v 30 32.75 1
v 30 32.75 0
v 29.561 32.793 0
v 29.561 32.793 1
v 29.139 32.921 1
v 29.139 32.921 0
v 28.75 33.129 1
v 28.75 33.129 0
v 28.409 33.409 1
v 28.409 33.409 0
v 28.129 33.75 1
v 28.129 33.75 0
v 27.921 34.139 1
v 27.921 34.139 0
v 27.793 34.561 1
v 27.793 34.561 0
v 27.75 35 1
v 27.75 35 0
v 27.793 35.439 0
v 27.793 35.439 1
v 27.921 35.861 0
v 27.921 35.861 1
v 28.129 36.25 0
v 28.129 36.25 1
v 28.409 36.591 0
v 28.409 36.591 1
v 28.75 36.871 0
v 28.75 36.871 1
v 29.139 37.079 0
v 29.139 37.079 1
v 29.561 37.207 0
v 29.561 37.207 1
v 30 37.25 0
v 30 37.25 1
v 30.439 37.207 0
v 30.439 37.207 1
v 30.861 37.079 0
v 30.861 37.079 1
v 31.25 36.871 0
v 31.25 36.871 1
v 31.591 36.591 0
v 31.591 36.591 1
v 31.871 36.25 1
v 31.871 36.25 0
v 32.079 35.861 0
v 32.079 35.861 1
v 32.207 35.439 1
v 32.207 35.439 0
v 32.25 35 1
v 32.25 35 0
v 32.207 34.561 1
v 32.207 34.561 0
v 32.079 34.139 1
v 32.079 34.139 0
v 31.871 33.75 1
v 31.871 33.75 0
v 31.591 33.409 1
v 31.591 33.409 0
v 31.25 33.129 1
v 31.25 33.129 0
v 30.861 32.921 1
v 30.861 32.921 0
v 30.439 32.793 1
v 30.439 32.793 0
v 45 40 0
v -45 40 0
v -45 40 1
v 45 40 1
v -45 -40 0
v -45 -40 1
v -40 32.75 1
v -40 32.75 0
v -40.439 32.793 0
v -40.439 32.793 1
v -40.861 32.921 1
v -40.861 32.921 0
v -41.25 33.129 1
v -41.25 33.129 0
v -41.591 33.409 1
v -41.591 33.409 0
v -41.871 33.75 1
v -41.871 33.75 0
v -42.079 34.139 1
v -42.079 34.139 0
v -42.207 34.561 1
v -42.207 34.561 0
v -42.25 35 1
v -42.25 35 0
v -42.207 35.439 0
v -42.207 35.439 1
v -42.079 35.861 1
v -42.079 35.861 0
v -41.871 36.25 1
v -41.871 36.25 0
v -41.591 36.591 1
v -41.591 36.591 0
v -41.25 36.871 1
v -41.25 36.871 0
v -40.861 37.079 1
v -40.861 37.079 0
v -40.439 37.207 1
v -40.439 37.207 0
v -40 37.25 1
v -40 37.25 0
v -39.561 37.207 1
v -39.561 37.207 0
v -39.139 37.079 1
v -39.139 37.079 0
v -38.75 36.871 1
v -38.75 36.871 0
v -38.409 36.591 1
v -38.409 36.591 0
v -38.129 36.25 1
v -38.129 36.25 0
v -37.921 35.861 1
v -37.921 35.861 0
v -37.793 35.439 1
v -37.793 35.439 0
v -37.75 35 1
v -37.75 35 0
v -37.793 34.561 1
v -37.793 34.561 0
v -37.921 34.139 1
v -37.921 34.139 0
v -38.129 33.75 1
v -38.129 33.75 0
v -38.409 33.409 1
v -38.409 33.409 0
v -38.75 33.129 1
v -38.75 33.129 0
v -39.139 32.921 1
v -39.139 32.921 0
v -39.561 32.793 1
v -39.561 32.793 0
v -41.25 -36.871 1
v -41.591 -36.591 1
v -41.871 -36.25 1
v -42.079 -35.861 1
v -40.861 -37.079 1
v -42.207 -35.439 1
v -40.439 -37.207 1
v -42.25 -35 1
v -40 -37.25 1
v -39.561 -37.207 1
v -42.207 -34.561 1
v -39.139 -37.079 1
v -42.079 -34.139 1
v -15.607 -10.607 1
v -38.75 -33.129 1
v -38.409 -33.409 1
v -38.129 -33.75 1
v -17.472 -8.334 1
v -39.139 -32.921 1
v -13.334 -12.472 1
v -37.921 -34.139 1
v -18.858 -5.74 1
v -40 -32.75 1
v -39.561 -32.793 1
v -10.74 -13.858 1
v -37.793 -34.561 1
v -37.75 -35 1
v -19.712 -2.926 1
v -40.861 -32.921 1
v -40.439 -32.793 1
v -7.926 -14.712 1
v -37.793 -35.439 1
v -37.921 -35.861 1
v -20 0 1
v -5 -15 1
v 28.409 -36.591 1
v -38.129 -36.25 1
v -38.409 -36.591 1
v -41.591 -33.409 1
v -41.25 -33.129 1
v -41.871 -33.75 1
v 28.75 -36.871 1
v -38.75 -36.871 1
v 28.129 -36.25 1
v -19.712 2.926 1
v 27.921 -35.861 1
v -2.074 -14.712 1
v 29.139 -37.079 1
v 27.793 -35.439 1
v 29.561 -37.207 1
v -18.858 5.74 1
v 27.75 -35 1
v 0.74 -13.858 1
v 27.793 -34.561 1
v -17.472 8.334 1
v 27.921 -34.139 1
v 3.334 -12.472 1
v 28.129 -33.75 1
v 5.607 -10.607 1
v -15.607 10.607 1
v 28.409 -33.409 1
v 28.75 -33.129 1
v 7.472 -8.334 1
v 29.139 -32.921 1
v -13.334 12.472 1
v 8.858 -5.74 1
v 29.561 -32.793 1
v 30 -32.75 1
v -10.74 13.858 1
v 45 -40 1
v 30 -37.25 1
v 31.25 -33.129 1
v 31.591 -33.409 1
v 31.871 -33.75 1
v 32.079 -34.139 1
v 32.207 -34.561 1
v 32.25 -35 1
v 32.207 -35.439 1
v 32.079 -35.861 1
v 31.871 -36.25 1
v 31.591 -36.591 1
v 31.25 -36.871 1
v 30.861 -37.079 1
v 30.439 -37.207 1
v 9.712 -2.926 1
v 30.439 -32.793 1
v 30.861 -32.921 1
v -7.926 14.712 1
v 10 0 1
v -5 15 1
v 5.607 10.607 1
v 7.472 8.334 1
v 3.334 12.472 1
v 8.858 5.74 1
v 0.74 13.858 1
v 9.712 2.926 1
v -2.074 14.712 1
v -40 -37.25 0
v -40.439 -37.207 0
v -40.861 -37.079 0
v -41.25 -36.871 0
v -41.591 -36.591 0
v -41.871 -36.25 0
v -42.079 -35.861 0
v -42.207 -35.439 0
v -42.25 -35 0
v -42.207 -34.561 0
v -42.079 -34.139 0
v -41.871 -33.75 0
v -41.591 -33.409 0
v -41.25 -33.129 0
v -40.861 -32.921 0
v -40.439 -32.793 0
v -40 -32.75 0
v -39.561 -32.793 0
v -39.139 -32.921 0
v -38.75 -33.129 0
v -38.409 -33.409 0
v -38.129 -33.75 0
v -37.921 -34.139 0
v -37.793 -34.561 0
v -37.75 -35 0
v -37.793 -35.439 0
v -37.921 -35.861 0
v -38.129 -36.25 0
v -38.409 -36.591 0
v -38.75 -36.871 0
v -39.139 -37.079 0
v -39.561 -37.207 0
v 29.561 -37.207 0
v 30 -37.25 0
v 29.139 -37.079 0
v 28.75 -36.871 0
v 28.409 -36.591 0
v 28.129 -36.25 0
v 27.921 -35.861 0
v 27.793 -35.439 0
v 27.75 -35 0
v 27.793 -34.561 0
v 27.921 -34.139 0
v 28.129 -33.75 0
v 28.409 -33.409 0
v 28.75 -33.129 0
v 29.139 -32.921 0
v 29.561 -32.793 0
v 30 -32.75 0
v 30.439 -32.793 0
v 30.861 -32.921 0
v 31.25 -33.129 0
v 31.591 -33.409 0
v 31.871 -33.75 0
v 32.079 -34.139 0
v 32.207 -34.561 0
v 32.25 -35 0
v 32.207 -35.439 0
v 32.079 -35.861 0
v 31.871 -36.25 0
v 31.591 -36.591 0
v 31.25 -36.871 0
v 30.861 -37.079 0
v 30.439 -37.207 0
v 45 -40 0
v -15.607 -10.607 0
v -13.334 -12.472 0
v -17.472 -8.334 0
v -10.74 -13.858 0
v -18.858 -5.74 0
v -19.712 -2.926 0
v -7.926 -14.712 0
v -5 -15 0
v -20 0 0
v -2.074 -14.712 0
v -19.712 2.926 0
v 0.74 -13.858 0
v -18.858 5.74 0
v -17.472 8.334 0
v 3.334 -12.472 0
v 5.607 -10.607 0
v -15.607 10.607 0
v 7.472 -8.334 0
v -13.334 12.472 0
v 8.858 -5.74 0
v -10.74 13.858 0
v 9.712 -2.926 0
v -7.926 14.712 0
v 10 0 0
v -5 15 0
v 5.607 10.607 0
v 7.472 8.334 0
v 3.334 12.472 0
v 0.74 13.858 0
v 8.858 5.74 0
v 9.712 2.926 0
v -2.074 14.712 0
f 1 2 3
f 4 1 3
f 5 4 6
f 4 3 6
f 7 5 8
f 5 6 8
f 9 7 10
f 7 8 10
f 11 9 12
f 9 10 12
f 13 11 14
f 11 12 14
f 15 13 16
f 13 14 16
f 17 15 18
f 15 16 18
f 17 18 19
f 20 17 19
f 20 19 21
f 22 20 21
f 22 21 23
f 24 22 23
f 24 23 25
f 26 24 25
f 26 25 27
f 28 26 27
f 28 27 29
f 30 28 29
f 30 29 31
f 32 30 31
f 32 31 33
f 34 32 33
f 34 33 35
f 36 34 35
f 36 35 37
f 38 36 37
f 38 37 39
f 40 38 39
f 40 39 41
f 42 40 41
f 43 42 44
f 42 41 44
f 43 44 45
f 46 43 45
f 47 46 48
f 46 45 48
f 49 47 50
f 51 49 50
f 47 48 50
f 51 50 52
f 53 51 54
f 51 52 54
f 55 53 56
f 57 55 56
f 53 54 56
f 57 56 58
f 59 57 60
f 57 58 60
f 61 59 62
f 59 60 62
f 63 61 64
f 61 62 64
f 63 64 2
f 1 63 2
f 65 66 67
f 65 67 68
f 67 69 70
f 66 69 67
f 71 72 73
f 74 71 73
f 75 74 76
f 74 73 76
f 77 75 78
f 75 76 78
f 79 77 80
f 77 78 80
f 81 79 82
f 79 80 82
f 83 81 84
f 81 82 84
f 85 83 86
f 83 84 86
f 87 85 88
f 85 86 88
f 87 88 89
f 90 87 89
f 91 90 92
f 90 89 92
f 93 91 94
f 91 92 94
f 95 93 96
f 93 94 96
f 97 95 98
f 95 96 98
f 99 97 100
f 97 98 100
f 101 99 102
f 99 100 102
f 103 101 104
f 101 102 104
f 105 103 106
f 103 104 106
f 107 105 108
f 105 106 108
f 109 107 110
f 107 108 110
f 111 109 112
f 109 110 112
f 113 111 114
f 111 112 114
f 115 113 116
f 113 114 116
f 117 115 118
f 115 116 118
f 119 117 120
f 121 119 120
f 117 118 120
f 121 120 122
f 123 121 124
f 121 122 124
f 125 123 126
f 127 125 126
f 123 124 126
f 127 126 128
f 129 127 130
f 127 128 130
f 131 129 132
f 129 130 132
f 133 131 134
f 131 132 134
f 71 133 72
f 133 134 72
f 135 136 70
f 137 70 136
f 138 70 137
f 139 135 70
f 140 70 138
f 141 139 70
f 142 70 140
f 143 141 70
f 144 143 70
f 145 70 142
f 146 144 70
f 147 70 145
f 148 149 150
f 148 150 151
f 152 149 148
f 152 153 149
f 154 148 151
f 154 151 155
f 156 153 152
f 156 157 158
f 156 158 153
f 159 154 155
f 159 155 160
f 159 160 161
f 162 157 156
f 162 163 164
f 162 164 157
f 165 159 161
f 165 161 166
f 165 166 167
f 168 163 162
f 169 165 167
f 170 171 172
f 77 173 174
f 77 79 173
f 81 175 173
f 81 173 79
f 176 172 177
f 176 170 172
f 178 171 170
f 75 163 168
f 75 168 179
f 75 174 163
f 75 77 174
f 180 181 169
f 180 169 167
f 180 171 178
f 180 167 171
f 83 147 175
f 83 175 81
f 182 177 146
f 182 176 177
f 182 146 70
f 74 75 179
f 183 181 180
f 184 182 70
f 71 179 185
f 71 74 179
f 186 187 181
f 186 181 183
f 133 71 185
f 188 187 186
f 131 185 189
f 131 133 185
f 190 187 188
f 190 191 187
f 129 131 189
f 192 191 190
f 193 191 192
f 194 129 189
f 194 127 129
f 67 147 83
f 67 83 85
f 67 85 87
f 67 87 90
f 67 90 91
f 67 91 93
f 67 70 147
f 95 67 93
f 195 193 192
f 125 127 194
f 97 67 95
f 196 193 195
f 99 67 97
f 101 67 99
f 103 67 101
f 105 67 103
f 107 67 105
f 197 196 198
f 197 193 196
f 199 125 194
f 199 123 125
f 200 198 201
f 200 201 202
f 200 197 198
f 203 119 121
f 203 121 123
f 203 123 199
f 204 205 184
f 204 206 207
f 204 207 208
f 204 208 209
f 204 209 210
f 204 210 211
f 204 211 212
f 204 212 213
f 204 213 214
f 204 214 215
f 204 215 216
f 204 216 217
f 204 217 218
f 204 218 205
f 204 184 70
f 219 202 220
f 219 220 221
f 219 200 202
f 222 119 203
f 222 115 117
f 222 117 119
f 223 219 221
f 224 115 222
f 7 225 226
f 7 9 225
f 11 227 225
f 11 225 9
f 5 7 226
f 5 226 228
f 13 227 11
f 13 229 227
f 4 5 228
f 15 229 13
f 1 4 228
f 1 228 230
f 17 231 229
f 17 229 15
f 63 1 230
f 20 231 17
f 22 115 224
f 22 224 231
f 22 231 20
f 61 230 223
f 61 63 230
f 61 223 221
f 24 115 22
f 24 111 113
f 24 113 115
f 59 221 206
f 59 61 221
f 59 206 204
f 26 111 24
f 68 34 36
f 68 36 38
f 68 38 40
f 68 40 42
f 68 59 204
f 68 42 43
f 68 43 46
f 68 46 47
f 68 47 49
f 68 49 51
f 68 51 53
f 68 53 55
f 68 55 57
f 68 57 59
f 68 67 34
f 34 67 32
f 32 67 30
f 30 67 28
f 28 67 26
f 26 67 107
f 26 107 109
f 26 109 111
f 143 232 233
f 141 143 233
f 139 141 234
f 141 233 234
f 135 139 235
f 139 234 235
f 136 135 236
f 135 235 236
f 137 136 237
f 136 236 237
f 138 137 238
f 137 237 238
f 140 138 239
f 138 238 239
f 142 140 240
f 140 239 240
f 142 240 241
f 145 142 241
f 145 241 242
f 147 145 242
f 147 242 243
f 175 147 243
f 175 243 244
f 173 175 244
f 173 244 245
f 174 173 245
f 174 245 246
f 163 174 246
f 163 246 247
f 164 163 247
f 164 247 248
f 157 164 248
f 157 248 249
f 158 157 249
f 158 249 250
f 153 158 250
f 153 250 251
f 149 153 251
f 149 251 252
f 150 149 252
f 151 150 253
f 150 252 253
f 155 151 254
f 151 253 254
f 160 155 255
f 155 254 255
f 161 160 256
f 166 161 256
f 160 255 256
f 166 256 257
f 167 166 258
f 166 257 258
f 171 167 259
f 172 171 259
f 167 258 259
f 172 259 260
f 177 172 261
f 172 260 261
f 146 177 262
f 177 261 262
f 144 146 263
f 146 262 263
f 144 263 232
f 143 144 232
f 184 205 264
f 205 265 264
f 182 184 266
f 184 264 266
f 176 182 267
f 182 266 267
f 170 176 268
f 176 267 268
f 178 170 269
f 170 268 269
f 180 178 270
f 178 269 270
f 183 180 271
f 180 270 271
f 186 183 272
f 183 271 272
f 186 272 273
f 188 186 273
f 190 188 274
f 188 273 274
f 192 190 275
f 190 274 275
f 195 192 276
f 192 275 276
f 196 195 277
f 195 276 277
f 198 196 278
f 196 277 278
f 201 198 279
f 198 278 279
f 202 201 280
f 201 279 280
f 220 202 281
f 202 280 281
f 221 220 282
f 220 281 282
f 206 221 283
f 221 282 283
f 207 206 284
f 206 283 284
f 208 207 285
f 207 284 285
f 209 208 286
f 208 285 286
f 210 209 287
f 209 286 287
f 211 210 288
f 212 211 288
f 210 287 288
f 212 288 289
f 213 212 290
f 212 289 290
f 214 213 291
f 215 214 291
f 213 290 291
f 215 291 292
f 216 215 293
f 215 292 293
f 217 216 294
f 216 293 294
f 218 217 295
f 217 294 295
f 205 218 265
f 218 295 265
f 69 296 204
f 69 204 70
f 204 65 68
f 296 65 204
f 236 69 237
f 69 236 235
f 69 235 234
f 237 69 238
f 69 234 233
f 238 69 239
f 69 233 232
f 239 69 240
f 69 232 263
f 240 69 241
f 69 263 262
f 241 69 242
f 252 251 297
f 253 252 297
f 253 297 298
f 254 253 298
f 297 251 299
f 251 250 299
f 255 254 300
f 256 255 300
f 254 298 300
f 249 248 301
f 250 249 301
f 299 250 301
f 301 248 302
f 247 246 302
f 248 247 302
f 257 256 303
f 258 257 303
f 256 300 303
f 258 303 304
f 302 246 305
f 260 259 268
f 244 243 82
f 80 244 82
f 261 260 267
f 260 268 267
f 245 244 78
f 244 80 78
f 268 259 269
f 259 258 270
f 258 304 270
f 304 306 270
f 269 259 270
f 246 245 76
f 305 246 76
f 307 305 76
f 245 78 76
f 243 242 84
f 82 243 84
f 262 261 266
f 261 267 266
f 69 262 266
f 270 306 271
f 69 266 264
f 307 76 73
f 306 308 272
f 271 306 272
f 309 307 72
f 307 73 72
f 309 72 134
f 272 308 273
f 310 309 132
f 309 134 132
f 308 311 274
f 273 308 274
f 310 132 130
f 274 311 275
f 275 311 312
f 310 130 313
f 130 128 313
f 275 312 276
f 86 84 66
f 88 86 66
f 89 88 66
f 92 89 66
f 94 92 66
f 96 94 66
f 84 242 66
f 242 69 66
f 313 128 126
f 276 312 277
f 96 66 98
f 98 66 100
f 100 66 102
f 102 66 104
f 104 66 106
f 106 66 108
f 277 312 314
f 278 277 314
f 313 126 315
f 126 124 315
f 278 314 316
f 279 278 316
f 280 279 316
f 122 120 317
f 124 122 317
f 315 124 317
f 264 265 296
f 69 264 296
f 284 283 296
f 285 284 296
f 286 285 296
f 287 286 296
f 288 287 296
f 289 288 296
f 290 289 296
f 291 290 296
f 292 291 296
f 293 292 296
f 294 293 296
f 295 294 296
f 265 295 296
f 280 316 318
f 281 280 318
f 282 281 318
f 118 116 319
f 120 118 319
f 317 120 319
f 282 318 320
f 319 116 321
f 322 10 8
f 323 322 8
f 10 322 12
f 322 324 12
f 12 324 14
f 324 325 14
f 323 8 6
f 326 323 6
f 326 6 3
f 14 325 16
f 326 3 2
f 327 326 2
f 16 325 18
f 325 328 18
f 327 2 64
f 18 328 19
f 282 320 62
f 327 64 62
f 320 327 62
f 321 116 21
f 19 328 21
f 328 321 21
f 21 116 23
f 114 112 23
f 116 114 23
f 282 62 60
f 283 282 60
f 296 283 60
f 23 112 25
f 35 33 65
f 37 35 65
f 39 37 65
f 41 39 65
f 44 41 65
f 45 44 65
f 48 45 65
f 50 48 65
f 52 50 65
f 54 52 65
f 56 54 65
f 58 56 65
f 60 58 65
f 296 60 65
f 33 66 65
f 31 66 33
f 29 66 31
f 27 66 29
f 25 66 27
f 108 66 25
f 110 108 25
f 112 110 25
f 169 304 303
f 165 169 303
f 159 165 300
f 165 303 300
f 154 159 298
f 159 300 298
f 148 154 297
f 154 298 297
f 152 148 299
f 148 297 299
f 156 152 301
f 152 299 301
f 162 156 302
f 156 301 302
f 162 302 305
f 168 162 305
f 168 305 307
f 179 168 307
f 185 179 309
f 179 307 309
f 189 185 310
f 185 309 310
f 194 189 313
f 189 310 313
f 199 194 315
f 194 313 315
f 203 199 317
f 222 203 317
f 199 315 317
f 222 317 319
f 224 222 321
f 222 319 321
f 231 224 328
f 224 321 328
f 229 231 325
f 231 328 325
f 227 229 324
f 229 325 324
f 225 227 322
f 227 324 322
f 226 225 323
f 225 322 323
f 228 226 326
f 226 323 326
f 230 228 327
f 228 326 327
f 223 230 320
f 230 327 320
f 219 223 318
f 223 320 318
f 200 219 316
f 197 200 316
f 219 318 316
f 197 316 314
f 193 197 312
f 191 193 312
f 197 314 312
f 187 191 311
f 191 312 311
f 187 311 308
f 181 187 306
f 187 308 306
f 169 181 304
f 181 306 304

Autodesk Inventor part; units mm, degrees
ref_plane "YZ Plane" through (0, 0, 0) normal (1, 0, 0) x (0, 1, 0)
ref_plane "XZ Plane" through (0, 0, 0) normal (0, 1, 0) x (-1, 0, 0)
ref_plane "XY Plane" through (0, 0, 0) normal (0, 0, 1) x (1, 0, 0)
sketch "Skizze1" plane through (0, 0, 0) normal (0, 0, 1) x (1, 0, 0)
  line L0 (45, -40) -> (-45, -40)
  line L1 (-45, -40) -> (-45, 40)
  line L2 (-45, 40) -> (45, 40)
  line L3 (45, 40) -> (45, -40)
  line L4 (45, -40) -> (-45, 40) construction
  line L5 (-45, -40) -> (45, 40) construction
  point P0 (0, 0)
  dimension "d0" = 90
  dimension "d1" = 80
extrude "Extrusion1" add sketch "Skizze1" along normal blind 1
sketch "Skizze2" plane through (0, 0, 1) normal (0, 0, 1) x (1, 0, 0)
  line L0 (-45, 40) -> (-45, -40) projected
  line L1 (-45, -40) -> (45, -40) projected
  point P0 (-5, 0)
  dimension "d13" = 40
  dimension "d23" = 40
hole "Bohrung1" at (-5, 0, 1) direction (0, 0, -1) diameter 30 end through all
sketch "Skizze3" plane through (0, 0, 1) normal (0, 0, 1) x (1, 0, 0)
  circle A0 centre (-5, 0) radius 15 projected
  line L0 (30, 35) -> (-40, 35)
  line L1 (-40, 35) -> (-40, -35)
  line L2 (-40, -35) -> (30, -35)
  line L3 (30, -35) -> (30, 35)
  line L4 (30, 35) -> (-40, -35) construction
  line L5 (-40, 35) -> (30, -35) construction
  point P0 (0, 0)
  dimension "d14" = 70
hole "Bohrung2" at (30, -35, 1) at (-40, -35, 1) at (-40, 35, 1) at (30, 35, 1) direction (0, 0, -1) diameter 4.5 end through all clearance for "Flachkopfsenkschraube DIN EN ISO 2009" size "M4" standard "DIN"
equation "\"d23\" = d13"
properties part number "Tunel_BackCoverToOdourPort" material "Edelstahl"
